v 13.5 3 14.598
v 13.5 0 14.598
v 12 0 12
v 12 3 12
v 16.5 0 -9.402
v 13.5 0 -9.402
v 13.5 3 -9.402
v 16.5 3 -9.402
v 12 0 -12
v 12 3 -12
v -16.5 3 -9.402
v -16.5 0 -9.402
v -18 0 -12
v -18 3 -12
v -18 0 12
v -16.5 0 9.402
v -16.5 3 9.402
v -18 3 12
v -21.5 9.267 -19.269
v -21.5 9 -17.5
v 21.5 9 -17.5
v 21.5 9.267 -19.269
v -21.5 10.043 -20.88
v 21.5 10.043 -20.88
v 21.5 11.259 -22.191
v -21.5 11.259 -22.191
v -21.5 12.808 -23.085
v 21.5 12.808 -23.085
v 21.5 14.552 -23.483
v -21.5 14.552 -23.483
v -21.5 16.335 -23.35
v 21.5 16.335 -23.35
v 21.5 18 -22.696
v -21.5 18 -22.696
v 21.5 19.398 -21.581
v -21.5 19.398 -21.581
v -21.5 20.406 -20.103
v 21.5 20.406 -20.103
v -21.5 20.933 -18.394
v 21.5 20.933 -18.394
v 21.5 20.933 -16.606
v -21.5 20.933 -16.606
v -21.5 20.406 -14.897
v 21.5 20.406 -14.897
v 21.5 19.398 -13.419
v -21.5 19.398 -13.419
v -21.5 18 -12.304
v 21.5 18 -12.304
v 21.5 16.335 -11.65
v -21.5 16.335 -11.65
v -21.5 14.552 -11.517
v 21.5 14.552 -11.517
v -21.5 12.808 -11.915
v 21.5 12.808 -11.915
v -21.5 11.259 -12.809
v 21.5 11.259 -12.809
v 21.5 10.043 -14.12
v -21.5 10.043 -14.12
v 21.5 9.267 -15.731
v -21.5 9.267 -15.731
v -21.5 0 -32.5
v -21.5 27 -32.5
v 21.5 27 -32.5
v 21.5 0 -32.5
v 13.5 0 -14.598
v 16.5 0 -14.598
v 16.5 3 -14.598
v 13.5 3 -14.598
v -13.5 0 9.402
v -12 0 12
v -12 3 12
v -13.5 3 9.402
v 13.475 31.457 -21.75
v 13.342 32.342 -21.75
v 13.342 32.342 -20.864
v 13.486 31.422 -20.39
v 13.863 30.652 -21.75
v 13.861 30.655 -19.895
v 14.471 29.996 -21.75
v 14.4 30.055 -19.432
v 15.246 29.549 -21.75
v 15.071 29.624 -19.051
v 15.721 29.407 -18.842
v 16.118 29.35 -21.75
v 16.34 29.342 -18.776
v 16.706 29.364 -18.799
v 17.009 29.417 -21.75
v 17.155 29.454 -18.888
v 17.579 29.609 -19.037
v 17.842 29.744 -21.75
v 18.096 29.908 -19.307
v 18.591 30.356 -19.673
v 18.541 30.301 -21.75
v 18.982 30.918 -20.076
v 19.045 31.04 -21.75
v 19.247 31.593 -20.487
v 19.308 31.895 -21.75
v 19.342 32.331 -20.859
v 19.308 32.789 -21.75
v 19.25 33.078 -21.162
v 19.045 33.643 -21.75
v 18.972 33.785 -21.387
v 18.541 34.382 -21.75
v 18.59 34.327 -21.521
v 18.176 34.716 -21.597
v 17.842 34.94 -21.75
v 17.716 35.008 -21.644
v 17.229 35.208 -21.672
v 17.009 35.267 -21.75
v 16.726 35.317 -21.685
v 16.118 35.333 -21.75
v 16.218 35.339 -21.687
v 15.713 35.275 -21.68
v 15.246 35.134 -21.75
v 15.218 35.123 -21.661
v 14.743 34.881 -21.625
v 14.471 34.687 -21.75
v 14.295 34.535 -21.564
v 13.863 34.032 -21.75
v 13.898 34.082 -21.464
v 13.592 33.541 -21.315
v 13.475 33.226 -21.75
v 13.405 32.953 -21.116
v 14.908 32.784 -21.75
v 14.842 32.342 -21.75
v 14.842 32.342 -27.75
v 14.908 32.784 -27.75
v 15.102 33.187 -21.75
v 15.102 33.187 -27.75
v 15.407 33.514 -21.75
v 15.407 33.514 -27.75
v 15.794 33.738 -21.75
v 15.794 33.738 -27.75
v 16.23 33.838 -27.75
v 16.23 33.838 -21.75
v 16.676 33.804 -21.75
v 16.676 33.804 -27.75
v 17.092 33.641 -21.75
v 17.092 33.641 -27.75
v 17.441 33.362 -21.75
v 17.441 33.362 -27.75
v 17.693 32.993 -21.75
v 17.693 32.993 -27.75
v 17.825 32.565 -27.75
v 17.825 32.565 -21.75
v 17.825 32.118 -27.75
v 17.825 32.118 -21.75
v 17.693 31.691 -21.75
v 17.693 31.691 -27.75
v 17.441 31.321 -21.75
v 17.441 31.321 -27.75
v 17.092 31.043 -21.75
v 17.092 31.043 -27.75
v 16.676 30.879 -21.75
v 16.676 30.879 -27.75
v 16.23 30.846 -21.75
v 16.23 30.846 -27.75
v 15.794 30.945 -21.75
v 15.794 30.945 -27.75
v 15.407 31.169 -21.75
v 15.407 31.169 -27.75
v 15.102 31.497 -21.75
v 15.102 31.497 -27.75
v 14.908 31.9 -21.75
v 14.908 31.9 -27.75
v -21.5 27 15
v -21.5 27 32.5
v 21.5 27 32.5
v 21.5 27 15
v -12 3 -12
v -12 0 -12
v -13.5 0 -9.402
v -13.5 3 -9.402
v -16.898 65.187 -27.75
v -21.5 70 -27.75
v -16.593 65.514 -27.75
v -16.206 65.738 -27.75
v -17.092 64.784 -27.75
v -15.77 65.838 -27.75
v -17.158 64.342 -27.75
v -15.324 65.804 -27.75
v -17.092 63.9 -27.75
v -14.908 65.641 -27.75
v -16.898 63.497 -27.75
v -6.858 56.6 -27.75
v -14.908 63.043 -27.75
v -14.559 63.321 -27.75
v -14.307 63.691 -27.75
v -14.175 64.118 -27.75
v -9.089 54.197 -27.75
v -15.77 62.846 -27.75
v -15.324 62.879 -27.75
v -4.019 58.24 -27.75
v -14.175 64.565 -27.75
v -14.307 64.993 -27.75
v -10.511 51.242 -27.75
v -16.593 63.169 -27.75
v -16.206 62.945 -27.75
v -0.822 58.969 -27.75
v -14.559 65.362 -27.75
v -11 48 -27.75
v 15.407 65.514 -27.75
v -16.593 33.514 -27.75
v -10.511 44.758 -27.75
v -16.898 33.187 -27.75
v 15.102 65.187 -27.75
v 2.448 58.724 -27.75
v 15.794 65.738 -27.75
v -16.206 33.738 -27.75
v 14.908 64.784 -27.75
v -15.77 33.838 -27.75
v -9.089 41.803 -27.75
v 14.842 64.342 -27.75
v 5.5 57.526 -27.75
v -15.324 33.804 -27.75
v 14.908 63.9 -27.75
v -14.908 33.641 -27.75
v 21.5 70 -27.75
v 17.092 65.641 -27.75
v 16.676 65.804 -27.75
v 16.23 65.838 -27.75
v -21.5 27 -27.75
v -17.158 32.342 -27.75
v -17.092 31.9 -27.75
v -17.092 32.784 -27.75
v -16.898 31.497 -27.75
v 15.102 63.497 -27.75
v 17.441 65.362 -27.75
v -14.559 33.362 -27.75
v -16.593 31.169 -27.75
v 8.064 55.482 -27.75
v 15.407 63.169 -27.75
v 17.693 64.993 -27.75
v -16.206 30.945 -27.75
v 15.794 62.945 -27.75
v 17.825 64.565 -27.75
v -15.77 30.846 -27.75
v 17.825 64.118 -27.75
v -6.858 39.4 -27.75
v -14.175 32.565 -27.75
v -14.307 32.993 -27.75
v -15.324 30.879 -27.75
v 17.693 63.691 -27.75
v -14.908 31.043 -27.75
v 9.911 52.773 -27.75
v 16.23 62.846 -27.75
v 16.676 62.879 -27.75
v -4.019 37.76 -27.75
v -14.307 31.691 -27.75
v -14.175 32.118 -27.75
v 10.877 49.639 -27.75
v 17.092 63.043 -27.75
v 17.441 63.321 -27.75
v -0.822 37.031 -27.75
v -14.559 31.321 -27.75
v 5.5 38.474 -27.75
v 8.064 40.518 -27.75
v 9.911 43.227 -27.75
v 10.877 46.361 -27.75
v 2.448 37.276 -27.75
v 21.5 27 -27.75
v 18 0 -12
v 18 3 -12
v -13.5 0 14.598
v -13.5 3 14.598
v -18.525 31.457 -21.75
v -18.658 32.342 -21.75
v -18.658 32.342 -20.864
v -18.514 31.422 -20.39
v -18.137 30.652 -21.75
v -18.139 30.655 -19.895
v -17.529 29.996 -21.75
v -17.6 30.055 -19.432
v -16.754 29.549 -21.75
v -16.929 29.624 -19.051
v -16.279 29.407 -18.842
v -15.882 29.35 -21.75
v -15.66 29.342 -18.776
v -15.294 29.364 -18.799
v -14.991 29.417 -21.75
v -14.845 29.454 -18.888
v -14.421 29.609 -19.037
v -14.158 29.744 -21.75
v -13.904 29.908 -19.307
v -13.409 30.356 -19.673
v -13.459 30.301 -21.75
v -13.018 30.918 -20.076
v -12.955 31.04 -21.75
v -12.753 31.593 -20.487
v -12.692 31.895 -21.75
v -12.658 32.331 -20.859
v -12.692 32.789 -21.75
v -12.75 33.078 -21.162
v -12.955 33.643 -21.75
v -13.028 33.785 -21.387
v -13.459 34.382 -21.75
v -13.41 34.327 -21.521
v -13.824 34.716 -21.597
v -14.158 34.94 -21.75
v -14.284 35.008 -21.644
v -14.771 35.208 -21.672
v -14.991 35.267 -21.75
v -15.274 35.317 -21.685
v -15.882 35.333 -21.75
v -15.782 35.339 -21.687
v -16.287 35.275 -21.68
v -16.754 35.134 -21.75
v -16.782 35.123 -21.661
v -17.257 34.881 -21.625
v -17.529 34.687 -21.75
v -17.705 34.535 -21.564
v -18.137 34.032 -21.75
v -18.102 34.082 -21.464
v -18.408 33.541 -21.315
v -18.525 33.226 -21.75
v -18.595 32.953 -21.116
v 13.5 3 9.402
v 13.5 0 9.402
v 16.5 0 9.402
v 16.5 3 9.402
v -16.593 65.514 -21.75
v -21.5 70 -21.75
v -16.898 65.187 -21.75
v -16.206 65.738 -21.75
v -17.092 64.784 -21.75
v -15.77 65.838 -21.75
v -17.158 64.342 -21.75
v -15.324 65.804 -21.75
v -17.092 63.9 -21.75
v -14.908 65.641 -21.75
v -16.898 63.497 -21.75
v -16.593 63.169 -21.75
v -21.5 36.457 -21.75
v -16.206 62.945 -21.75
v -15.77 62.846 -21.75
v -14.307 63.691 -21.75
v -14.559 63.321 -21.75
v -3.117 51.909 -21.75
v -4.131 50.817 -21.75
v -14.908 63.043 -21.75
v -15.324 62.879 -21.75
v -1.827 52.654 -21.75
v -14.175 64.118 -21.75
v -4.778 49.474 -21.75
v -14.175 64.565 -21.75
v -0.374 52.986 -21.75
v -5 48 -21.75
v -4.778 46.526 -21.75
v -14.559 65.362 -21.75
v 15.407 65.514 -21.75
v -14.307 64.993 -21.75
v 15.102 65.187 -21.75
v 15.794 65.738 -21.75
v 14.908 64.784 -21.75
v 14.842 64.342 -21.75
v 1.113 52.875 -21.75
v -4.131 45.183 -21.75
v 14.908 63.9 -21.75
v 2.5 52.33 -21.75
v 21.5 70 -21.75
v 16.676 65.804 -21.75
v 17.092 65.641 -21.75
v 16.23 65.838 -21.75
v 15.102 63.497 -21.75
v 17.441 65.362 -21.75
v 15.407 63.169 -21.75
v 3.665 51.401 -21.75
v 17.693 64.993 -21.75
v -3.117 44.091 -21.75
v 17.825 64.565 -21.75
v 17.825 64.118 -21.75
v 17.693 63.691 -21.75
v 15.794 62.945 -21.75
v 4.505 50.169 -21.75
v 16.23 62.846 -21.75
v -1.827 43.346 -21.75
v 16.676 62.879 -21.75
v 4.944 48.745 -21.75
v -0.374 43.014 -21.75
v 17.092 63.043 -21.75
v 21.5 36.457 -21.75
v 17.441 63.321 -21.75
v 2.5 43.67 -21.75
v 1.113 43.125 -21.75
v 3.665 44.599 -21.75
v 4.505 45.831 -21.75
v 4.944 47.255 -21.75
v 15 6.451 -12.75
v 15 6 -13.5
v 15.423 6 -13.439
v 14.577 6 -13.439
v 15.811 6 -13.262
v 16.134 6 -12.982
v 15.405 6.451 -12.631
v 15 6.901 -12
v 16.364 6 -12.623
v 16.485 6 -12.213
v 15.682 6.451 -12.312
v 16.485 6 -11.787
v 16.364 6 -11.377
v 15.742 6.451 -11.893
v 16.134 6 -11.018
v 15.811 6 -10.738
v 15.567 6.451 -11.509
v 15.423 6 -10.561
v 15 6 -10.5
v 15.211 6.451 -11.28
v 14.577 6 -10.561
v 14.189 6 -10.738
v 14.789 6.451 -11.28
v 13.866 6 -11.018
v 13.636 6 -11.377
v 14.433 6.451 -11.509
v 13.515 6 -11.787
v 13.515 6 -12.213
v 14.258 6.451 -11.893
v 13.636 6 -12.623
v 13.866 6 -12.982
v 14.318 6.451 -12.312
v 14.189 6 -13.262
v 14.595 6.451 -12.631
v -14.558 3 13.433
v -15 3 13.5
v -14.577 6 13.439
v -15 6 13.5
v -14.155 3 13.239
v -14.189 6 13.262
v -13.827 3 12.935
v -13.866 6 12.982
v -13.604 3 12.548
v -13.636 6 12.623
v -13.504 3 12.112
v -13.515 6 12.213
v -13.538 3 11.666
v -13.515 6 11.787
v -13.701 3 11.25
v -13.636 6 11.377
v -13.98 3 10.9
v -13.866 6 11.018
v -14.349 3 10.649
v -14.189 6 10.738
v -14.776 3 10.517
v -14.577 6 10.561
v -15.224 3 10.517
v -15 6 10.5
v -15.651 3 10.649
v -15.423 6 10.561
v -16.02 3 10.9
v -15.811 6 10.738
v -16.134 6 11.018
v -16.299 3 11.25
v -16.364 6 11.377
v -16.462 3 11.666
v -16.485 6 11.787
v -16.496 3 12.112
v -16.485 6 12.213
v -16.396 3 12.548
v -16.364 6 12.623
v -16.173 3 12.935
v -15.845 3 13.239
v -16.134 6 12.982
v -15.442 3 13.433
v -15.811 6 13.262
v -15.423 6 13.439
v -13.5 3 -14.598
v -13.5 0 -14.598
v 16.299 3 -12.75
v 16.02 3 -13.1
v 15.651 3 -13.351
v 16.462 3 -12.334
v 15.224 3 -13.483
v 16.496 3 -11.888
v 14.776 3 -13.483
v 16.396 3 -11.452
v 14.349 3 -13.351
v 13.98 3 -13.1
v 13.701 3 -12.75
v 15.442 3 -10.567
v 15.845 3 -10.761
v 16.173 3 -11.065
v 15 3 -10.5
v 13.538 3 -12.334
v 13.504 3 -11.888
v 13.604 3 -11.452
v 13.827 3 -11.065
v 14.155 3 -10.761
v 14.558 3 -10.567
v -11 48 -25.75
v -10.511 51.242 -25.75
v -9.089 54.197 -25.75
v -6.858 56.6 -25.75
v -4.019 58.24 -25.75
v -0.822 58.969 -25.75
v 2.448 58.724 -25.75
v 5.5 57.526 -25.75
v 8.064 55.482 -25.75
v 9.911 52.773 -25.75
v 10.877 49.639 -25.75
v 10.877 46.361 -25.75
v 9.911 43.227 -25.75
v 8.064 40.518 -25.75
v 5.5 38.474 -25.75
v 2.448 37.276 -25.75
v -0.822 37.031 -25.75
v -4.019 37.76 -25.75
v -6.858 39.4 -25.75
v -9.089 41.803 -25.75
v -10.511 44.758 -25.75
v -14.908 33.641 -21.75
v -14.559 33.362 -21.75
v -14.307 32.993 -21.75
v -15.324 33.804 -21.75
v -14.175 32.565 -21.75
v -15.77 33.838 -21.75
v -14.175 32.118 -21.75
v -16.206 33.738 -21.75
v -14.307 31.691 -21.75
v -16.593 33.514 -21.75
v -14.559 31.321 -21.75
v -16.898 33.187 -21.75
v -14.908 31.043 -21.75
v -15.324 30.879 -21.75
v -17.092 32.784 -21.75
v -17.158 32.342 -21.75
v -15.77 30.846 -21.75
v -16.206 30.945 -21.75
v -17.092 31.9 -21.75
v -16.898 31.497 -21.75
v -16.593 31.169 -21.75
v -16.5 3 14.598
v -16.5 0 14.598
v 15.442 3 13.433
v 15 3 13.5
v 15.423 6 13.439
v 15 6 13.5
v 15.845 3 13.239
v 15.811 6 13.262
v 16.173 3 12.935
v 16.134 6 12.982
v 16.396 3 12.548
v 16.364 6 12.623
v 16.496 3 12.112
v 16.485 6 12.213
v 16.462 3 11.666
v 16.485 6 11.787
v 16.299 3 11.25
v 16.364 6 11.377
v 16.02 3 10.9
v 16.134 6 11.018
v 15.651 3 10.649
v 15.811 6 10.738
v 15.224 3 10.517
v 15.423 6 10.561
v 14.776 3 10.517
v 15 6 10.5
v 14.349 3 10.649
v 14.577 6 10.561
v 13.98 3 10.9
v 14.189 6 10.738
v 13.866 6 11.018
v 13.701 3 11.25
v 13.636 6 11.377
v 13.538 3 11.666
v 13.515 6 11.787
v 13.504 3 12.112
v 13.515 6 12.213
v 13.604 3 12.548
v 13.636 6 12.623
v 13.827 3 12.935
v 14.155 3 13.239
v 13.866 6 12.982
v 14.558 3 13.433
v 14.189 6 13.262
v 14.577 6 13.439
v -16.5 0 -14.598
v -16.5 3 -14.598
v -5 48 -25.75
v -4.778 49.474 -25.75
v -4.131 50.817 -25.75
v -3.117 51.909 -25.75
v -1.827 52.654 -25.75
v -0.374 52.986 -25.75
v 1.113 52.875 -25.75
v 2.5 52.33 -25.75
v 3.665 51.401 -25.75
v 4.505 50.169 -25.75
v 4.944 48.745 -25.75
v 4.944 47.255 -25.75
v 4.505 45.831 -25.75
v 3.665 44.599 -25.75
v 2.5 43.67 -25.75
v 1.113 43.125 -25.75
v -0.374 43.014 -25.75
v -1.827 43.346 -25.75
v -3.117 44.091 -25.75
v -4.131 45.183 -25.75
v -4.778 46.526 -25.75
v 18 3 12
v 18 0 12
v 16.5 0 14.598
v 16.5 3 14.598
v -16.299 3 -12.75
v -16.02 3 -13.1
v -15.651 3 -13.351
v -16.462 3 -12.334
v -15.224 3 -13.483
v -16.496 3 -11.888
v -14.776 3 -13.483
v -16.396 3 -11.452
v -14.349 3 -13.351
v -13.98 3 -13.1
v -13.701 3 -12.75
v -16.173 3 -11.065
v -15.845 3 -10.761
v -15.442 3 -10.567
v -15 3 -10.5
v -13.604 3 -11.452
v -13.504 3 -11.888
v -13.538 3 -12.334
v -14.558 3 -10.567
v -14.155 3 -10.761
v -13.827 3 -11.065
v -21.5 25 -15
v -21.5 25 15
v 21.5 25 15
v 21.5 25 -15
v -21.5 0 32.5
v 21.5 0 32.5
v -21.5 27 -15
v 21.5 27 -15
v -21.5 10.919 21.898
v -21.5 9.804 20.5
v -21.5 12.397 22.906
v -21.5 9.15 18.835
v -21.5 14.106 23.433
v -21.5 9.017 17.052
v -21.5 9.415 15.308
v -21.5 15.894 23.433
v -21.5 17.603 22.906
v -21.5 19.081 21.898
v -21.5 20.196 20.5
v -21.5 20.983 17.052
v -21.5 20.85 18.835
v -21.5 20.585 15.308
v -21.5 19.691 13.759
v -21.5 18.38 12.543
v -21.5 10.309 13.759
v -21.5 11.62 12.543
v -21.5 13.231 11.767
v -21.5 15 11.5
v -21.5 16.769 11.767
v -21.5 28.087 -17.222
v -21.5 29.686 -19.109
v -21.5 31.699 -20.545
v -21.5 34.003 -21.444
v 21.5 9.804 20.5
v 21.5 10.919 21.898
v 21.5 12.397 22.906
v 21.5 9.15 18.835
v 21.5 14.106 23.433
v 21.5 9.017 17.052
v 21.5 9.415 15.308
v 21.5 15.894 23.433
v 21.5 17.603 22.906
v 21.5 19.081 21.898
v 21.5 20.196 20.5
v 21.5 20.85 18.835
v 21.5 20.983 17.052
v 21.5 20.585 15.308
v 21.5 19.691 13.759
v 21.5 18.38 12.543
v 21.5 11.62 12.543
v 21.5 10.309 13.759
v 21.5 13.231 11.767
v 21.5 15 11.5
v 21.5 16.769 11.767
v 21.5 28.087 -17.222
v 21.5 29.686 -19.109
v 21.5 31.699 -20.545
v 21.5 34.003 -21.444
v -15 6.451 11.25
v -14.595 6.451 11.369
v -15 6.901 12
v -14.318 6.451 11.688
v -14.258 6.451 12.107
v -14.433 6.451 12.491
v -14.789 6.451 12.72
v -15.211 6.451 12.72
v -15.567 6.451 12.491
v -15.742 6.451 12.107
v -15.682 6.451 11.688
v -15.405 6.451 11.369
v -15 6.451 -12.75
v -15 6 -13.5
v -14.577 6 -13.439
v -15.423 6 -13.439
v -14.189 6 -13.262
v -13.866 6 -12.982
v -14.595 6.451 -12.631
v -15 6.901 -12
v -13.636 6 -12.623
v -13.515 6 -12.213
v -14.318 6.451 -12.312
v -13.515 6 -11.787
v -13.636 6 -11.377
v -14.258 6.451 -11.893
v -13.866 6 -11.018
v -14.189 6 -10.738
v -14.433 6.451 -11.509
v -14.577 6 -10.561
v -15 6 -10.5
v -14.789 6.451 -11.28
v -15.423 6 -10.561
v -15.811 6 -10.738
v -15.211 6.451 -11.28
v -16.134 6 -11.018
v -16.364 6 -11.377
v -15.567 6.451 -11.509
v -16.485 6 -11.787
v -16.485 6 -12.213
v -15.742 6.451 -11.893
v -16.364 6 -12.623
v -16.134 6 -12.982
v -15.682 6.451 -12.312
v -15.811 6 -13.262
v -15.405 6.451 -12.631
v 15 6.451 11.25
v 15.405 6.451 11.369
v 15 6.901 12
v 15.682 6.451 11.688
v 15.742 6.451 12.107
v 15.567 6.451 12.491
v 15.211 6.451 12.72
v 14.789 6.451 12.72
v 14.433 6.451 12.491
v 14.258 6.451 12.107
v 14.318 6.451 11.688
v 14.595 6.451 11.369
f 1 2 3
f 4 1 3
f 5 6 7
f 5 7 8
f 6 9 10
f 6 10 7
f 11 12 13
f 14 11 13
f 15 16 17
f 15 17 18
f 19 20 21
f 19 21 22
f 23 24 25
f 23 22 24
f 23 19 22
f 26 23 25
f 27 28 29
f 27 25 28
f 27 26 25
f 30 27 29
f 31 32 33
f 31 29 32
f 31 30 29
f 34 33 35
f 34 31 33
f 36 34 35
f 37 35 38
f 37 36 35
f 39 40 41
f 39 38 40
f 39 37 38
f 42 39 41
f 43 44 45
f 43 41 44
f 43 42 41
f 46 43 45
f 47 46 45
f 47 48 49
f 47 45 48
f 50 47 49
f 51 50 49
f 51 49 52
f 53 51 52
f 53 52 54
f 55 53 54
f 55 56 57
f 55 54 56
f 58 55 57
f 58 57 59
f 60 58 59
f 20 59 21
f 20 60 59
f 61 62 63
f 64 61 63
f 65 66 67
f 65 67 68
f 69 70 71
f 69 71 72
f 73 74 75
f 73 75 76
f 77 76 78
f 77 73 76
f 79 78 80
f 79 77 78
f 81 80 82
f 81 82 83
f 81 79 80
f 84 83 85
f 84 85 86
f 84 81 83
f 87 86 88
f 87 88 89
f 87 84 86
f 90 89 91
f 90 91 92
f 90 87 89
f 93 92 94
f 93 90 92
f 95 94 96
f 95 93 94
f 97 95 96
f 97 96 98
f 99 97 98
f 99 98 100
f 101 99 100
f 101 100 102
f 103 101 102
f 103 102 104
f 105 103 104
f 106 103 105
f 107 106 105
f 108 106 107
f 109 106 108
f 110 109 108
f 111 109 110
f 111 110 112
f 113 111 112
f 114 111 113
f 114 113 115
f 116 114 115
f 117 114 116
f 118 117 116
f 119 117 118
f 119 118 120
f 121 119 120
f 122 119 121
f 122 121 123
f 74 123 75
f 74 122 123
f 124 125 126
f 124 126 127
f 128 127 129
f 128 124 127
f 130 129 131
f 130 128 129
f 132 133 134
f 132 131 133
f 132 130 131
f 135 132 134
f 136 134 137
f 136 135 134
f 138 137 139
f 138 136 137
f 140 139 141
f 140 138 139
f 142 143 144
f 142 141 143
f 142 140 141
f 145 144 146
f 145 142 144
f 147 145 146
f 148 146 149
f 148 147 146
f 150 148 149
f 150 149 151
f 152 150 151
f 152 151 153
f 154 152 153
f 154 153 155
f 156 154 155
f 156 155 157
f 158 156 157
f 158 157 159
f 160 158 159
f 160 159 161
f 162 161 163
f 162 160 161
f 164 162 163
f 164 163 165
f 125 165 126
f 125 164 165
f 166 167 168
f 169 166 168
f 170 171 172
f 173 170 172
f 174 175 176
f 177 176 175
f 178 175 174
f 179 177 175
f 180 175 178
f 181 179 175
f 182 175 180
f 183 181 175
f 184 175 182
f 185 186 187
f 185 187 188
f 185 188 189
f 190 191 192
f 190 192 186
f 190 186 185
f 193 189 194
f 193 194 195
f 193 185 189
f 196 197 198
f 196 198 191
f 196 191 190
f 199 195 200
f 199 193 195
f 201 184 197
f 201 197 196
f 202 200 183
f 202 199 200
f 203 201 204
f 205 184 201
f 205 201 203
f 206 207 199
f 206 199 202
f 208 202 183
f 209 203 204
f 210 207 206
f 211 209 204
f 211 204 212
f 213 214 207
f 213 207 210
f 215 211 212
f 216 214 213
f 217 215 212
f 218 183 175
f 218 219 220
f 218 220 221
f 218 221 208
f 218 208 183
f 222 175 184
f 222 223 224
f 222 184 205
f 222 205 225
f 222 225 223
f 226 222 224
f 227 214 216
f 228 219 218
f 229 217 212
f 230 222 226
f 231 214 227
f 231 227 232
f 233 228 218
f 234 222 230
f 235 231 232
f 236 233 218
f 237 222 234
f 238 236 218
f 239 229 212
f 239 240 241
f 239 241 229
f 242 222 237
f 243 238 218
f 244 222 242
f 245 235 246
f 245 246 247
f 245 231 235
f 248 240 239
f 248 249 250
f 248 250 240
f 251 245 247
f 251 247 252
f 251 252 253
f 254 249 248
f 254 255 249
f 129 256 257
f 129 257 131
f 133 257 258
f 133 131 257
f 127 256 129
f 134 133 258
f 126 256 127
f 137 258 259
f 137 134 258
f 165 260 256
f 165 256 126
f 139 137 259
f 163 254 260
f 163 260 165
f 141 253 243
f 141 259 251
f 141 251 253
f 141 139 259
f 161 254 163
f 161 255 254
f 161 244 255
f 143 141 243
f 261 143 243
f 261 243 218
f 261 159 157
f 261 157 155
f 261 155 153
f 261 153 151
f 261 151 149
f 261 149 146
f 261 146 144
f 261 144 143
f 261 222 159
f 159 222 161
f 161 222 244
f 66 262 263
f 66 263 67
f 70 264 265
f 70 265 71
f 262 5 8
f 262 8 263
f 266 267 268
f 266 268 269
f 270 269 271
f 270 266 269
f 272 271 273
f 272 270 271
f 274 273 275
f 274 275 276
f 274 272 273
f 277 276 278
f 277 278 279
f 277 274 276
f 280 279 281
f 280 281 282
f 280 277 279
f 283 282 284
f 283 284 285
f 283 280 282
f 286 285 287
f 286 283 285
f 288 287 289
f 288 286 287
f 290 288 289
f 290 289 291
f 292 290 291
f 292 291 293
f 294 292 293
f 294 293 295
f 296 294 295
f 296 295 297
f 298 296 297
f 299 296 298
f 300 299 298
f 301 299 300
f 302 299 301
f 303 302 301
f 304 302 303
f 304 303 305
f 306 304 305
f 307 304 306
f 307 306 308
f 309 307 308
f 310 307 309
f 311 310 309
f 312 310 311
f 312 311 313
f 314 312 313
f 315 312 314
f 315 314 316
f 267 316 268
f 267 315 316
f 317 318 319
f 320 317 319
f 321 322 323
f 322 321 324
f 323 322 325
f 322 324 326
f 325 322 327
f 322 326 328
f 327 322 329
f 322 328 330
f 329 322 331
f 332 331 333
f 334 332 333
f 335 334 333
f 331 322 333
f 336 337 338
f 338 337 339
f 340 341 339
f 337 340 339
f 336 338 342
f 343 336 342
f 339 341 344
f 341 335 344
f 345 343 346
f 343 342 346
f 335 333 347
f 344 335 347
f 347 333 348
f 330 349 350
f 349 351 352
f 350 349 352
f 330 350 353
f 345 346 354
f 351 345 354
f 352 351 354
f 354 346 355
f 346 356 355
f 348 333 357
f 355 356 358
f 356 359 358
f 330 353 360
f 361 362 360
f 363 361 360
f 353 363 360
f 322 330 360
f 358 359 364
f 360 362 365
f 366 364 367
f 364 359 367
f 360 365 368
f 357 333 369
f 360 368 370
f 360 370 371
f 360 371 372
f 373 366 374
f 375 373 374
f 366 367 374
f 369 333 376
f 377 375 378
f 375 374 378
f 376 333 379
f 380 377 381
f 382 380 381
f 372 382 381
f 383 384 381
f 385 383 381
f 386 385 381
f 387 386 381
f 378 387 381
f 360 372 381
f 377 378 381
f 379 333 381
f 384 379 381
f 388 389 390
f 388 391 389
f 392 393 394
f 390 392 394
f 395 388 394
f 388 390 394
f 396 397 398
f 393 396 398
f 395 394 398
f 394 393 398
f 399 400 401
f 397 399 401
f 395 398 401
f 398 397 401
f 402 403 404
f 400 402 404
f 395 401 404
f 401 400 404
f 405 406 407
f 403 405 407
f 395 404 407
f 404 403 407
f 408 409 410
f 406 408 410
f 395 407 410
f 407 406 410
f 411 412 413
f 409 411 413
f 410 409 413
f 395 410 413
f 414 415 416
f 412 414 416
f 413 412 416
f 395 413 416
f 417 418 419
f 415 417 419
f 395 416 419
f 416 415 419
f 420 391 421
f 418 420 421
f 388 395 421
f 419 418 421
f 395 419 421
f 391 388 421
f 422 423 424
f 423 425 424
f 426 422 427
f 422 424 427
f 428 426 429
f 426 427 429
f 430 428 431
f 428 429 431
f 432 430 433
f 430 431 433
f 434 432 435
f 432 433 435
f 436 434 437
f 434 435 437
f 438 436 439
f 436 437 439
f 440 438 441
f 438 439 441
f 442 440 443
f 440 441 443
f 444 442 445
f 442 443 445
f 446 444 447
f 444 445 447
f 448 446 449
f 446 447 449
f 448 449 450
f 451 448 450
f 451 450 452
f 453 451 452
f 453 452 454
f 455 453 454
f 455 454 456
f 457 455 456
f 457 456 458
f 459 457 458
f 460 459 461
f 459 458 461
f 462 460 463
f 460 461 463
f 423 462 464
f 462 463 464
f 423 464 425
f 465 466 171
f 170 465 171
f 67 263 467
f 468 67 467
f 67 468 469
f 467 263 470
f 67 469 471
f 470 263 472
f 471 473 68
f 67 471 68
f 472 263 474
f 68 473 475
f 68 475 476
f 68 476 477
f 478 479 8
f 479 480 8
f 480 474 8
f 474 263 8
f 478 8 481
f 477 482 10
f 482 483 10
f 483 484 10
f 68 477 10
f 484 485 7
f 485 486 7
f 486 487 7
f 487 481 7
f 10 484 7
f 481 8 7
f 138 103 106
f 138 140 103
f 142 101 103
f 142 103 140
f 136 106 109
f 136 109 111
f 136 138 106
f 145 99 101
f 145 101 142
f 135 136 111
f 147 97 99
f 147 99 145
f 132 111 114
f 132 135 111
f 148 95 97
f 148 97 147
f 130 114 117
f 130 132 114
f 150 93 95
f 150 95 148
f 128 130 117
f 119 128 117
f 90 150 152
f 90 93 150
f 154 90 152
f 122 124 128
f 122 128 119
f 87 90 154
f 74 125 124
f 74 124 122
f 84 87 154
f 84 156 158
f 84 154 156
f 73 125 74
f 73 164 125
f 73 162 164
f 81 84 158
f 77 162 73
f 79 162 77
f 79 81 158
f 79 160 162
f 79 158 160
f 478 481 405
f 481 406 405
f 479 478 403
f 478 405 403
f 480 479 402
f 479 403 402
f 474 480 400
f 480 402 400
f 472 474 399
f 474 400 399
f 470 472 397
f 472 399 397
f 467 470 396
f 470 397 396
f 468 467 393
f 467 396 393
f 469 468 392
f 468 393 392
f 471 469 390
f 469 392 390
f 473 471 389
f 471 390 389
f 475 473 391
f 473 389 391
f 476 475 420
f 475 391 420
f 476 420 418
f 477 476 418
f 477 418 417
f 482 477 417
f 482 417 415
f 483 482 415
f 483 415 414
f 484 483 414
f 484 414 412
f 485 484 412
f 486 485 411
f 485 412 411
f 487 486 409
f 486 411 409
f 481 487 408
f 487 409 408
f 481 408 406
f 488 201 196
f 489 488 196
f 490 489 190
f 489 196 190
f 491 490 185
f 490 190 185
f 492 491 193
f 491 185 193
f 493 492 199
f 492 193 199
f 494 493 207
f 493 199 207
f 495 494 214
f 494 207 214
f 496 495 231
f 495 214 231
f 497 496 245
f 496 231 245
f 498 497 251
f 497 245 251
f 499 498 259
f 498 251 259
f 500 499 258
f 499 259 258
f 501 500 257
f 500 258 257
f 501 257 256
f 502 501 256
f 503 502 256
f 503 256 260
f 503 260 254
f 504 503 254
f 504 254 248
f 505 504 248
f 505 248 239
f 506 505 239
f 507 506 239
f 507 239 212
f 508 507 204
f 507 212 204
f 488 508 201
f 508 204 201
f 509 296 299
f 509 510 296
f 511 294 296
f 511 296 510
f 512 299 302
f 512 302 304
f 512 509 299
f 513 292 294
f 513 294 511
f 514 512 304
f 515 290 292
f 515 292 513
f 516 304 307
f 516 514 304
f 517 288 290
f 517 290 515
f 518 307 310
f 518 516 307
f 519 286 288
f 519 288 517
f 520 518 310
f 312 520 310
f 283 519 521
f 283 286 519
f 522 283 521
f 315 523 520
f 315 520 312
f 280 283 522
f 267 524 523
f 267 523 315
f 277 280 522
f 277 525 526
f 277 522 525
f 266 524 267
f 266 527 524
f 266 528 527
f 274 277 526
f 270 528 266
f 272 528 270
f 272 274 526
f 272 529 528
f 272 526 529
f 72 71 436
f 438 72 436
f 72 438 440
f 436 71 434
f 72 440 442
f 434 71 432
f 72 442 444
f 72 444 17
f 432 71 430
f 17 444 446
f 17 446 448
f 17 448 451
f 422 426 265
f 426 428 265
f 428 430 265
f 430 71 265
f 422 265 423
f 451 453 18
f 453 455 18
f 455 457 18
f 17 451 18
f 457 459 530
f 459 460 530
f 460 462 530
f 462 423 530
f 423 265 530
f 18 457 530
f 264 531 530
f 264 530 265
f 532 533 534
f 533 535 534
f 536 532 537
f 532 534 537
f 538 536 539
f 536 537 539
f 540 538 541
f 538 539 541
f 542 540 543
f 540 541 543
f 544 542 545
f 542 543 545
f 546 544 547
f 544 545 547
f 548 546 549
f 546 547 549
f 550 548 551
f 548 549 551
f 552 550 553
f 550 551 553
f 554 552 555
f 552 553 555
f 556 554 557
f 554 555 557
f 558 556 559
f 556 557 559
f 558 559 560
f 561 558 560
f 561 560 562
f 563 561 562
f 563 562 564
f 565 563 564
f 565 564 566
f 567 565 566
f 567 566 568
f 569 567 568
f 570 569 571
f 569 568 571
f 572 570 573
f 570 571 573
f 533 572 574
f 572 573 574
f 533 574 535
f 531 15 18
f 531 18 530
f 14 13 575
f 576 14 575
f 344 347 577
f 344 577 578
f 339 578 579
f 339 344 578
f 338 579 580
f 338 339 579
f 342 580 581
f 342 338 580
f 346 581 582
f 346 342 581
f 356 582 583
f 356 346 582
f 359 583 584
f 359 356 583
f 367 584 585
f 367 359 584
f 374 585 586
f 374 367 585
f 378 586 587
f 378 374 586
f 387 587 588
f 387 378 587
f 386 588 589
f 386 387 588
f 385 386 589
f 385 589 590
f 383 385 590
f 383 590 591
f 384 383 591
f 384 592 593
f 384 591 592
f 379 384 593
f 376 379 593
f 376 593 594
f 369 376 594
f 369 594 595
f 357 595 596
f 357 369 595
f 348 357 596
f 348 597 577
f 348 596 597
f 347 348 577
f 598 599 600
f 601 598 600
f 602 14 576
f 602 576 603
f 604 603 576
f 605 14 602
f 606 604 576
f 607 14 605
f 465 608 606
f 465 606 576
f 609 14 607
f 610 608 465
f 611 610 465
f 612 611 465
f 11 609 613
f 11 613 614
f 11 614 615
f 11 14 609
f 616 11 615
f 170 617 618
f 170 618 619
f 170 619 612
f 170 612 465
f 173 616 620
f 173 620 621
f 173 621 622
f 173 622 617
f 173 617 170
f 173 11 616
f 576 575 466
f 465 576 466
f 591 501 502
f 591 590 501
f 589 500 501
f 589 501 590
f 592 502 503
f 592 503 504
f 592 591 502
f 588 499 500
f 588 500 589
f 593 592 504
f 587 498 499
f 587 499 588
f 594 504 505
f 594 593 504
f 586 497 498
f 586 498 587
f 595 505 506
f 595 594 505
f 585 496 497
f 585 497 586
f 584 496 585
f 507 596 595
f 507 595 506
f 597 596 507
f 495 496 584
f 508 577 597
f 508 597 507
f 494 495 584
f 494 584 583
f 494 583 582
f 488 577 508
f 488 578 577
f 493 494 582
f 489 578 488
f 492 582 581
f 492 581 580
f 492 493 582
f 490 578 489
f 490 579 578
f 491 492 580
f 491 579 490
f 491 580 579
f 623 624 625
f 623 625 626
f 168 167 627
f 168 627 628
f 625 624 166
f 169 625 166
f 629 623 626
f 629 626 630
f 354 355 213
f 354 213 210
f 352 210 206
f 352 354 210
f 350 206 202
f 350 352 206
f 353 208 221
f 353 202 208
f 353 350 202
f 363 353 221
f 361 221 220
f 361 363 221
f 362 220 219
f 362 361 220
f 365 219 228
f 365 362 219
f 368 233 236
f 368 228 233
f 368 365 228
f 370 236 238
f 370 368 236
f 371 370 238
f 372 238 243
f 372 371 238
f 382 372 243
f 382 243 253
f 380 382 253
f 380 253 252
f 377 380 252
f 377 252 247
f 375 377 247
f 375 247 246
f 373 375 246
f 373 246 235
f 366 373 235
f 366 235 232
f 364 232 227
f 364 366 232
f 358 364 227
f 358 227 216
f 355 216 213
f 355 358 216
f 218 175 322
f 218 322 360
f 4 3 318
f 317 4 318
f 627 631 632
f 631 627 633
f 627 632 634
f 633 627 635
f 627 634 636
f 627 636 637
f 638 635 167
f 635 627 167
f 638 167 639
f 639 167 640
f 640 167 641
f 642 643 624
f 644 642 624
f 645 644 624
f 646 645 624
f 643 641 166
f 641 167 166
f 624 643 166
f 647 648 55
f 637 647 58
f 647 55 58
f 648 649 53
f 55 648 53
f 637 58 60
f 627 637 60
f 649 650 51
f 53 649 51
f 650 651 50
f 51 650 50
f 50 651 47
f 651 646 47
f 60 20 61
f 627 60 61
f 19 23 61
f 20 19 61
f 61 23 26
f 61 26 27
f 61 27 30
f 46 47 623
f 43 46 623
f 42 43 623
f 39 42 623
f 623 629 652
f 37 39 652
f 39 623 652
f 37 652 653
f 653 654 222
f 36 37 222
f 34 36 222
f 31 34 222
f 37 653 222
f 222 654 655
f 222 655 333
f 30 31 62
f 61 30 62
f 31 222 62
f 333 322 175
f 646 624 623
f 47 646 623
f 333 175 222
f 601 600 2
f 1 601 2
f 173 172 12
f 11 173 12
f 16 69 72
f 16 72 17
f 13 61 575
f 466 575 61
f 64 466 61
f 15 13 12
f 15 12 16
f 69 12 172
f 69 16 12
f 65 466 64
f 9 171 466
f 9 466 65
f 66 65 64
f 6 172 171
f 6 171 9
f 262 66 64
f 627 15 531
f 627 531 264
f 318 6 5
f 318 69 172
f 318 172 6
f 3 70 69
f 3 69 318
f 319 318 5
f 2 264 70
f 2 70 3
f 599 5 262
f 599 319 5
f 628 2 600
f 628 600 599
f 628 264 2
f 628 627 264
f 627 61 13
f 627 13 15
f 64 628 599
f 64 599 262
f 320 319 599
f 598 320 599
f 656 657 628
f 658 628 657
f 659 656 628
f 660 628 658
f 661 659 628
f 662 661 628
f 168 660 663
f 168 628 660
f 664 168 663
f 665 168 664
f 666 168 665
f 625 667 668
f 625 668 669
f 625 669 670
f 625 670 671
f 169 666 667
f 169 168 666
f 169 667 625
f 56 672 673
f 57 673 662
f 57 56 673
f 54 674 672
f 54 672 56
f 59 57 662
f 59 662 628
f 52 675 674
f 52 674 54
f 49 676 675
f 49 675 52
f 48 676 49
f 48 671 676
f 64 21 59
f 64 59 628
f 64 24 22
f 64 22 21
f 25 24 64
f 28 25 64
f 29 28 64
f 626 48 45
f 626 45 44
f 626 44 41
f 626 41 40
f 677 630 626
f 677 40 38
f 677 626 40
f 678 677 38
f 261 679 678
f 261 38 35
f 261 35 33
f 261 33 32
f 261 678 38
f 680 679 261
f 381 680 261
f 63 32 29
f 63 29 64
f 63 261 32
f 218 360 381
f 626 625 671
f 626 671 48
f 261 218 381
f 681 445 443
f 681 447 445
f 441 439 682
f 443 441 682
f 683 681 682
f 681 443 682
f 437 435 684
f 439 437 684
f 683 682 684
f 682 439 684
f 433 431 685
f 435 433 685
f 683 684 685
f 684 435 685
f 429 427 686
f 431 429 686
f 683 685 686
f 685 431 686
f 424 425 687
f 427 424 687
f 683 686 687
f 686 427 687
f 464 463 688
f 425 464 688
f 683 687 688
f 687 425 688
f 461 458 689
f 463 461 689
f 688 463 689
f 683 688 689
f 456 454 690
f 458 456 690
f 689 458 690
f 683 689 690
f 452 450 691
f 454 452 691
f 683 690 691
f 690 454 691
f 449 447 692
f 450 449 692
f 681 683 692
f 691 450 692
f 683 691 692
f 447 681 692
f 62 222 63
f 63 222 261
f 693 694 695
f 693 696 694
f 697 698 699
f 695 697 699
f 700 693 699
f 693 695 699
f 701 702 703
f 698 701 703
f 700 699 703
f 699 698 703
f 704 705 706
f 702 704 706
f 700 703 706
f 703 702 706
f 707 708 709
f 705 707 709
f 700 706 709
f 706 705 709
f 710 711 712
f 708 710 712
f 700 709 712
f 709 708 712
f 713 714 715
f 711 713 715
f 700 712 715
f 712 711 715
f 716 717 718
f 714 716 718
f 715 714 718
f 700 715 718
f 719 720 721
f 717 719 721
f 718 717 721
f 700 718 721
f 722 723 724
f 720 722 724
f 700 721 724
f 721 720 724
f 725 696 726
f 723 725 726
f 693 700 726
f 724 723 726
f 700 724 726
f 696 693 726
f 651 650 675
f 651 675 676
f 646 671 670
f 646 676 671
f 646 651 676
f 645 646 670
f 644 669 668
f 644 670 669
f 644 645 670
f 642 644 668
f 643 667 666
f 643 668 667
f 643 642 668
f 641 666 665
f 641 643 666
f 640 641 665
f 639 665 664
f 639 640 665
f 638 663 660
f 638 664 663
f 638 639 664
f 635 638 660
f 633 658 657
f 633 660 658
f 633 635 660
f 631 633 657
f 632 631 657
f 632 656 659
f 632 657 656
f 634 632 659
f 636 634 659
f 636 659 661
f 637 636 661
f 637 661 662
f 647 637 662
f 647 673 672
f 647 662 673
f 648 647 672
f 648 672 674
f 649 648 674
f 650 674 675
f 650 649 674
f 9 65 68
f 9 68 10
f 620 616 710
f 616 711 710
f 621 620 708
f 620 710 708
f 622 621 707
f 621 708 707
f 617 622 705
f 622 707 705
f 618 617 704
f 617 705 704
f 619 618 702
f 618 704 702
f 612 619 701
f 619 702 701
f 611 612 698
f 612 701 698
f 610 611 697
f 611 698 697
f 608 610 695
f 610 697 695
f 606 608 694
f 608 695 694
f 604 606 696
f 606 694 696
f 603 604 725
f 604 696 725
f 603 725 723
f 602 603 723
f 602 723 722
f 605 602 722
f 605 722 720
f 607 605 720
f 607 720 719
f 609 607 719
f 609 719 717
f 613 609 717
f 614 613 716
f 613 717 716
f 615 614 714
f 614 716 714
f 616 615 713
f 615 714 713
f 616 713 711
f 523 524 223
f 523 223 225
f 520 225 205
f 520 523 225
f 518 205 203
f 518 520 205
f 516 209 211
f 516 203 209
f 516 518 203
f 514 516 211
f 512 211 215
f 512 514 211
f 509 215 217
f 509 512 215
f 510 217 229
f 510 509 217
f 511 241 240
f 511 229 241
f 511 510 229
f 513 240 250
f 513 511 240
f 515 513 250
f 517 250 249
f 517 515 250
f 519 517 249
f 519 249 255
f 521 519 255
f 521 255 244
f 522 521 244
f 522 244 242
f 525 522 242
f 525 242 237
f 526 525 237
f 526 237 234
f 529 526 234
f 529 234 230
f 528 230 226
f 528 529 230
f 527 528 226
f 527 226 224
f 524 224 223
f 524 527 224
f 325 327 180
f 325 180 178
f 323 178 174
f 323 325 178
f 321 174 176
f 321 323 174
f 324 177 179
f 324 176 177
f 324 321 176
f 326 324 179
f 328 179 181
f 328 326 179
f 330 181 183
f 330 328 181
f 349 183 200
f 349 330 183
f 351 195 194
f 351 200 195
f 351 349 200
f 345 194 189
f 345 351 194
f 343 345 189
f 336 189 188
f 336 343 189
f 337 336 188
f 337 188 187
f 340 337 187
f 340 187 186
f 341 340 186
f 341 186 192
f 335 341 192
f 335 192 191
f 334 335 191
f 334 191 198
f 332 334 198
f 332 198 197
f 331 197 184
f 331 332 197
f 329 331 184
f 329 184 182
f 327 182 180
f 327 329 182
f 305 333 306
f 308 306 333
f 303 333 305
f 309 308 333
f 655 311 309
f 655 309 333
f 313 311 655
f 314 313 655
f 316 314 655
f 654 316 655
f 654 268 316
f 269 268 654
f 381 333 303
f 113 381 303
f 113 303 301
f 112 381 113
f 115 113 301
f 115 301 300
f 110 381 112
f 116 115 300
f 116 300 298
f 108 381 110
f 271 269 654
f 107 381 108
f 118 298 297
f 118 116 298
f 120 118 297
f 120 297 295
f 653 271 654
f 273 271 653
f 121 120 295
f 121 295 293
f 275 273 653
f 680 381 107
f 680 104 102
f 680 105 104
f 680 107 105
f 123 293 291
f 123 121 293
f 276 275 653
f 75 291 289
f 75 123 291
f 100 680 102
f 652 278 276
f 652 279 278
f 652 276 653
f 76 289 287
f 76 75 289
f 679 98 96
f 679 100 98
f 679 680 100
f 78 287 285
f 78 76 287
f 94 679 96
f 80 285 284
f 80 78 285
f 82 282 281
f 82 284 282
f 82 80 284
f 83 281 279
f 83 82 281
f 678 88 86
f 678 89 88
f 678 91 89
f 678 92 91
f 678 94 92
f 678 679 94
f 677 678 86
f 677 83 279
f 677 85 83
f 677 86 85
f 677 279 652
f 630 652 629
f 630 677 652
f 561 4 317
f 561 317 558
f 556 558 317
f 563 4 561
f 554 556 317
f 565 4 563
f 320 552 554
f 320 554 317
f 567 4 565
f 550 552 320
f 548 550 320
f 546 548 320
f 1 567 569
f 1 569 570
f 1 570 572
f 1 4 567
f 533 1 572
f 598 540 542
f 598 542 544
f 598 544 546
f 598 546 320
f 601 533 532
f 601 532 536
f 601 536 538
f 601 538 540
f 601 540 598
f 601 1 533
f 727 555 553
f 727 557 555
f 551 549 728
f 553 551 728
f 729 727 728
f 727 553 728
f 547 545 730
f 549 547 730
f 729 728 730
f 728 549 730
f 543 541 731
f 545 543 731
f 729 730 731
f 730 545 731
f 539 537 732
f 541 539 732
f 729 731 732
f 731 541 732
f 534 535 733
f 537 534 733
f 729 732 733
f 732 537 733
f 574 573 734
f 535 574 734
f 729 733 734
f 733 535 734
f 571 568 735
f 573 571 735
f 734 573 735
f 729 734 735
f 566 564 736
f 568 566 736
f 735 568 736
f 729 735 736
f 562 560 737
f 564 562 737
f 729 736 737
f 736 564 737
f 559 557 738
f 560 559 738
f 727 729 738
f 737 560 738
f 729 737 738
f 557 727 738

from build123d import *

# Parameters (mm, degrees)
SKETCH9_W                 = 43
SKETCH9_H                 = 27
BOSS_EXTRUDE1_DEPTH       = 32.5
CUT_EXTRUDE1_DEPTH        = 61.284741021
CUT_EXTRUDE1_DEPTH_BACK   = 61.284741021
SKETCH10_R                = 6
CUT_EXTRUDE2_DEPTH        = 3
CUT_EXTRUDE4_DEPTH        = 61.284741021
CUT_EXTRUDE4_DEPTH_BACK   = 61.284741021
SKETCH14_W                = 30
SKETCH14_H                = 2
SKETCH15_W                = 43
SKETCH15_H                = 6
BOSS_EXTRUDE2_DEPTH       = 43
F_3_0MM_DOWEL_HOLE1_D     = 3
F_3_0MM_DOWEL_HOLE1_DEPTH = 6
F_3_0MM_DOWEL_HOLE1_TIP   = 0.901290929
FILLET2_R                 = 10
SKETCH20_R                = 11
CUT_EXTRUDE5_DEPTH        = 2
CUT_EXTRUDE6_DEPTH        = 95.827804467
CUT_EXTRUDE6_DEPTH_BACK   = 95.827804467
SKETCH21_R                = 5
SKETCH21_R_2              = 1.5
SKETCH23_R                = 3
CUT_EXTRUDE7_DEPTH        = 6


with BuildPart() as part:
    # Sketch9 → Boss-Extrude1 (new, symmetric)
    with BuildSketch(Plane.XY):
        with Locations((0, 13.5)):
            Rectangle(SKETCH9_W, SKETCH9_H)
    extrude(amount=BOSS_EXTRUDE1_DEPTH, both=True)

    # Sketch10 → Cut-Extrude1 (cut, two sides: drawn at the far end of the back side and taken through both)
    with BuildSketch(Plane(origin=(21.5, 0, 0), x_dir=(0, 0, -1), z_dir=(1, 0, 0)).offset(-CUT_EXTRUDE1_DEPTH_BACK)):
        with Locations((-17.5, 15)):
            Circle(SKETCH10_R)
        with Locations(Location((17.5, 15, 0), (0, 0, 270))):
            Circle(SKETCH10_R)
    extrude(amount=CUT_EXTRUDE1_DEPTH + CUT_EXTRUDE1_DEPTH_BACK, mode=Mode.SUBTRACT)

    # Sketch11 → Cut-Extrude2 (cut)
    with BuildSketch(Plane.XZ):
        Polygon((12, -12), (13.5, -9.401923789), (16.5, -9.401923789), (18, -12), (16.5, -14.598076211), (13.5, -14.598076211), align=None)
        Polygon((13.5, 9.401923789), (16.5, 9.401923789), (18, 12), (16.5, 14.598076211), (13.5, 14.598076211), (12, 12), align=None)
        Polygon((-13.5, -9.401923789), (-16.5, -9.401923789), (-18, -12), (-16.5, -14.598076211), (-13.5, -14.598076211), (-12, -12), align=None)
        Polygon((-12, 12), (-13.5, 9.401923789), (-16.5, 9.401923789), (-18, 12), (-16.5, 14.598076211), (-13.5, 14.598076211), align=None)
    extrude(amount=-CUT_EXTRUDE2_DEPTH, mode=Mode.SUBTRACT)

    # Sketch14 → Cut-Extrude4 (cut, two sides: drawn at the far end of the back side and taken through both)
    with BuildSketch(Plane(origin=(21.5, 0, 0), x_dir=(0, 0, -1), z_dir=(1, 0, 0)).offset(-CUT_EXTRUDE4_DEPTH_BACK)):
        with Locations((0, 26)):
            Rectangle(SKETCH14_W, SKETCH14_H)
    extrude(amount=CUT_EXTRUDE4_DEPTH + CUT_EXTRUDE4_DEPTH_BACK, mode=Mode.SUBTRACT)

    # Sketch15 → Boss-Extrude2 (add)
    with BuildSketch(Plane(origin=(0, 27, 0), x_dir=(1, 0, 0), z_dir=(0, 1, 0))):
        with Locations((0, 24.75)):
            Rectangle(SKETCH15_W, SKETCH15_H)
    extrude(amount=BOSS_EXTRUDE2_DEPTH)

    # Ø3.0mm Dowel Hole1
    with Locations(Plane(origin=(15, 0, 12), x_dir=(0, 0, -1), z_dir=(0, -1, 0))):
        with Locations((0, 0), (0, -30), (24, -30), (24, 0)):
            Hole(F_3_0MM_DOWEL_HOLE1_D / 2, depth=F_3_0MM_DOWEL_HOLE1_DEPTH)
            with Locations((0, 0, -(F_3_0MM_DOWEL_HOLE1_DEPTH + F_3_0MM_DOWEL_HOLE1_TIP / 2))):  # 118° drill point
                Cone(0, F_3_0MM_DOWEL_HOLE1_D / 2, F_3_0MM_DOWEL_HOLE1_TIP, mode=Mode.SUBTRACT)

    # Fillet2
    # the kernel refuses this fillet: 10 mm, written as the material it adds along each edge
    with BuildSketch(Plane(origin=(21.5, 27, -21.75), x_dir=(0, 0, 1), z_dir=(-1, 0, 0))) as fillet2_piece_1:
        with BuildLine():
            CenterArc((10, 9.45714016), FILLET2_R, 180, 71.034425011)
            Line((0, 9.45714016), (-0.2, 9.45714016))
            Line((-0.2, 9.45714016), (-0.2, 0))
            Line((-0.2, 0), (0, -0.2))
            ThreePointArc((0, -0.2), (3.375, -0.2), (6.685, -0.189142803))
            Line((6.685, -0.189142803), (6.75, 0))
        make_face()
    extrude(amount=43)

    # Sketch20 → Cut-Extrude5 (cut)
    with BuildSketch(Plane(origin=(0, 0, -27.75), x_dir=(-1, 0, 0), z_dir=(0, 0, -1))):
        with Locations((0, 48)):
            Circle(SKETCH20_R)
    extrude(amount=-CUT_EXTRUDE5_DEPTH, mode=Mode.SUBTRACT)

    # Sketch21 → Cut-Extrude6 (cut, two sides: drawn at the far end of the back side and taken through both)
    with BuildSketch(Plane(origin=(0, 0, -27.75), x_dir=(-1, 0, 0), z_dir=(0, 0, -1)).offset(-CUT_EXTRUDE6_DEPTH_BACK)):
        with Locations((0, 48)):
            Circle(SKETCH21_R)
        with Locations((-16.341750707, 64.341750707)):
            Circle(SKETCH21_R_2)
        with Locations((15.658249293, 64.341750707)):
            Circle(SKETCH21_R_2)
        with Locations((15.658249293, 32.341750707)):
            Circle(SKETCH21_R_2)
        with Locations((-16.341750707, 32.341750707)):
            Circle(SKETCH21_R_2)
    extrude(amount=CUT_EXTRUDE6_DEPTH + CUT_EXTRUDE6_DEPTH_BACK, mode=Mode.SUBTRACT)

    # Sketch23 → Cut-Extrude7 (cut)
    with BuildSketch(Plane.XY.offset(-21.75)):
        with Locations(Location((-15.658249293, 32.341750707, 0), (0, 0, 180))):
            Circle(SKETCH23_R)
        with Locations(Location((16.341750707, 32.341750707, 0), (0, 0, 180))):
            Circle(SKETCH23_R)
    extrude(amount=CUT_EXTRUDE7_DEPTH, mode=Mode.SUBTRACT)


solid = part.part
